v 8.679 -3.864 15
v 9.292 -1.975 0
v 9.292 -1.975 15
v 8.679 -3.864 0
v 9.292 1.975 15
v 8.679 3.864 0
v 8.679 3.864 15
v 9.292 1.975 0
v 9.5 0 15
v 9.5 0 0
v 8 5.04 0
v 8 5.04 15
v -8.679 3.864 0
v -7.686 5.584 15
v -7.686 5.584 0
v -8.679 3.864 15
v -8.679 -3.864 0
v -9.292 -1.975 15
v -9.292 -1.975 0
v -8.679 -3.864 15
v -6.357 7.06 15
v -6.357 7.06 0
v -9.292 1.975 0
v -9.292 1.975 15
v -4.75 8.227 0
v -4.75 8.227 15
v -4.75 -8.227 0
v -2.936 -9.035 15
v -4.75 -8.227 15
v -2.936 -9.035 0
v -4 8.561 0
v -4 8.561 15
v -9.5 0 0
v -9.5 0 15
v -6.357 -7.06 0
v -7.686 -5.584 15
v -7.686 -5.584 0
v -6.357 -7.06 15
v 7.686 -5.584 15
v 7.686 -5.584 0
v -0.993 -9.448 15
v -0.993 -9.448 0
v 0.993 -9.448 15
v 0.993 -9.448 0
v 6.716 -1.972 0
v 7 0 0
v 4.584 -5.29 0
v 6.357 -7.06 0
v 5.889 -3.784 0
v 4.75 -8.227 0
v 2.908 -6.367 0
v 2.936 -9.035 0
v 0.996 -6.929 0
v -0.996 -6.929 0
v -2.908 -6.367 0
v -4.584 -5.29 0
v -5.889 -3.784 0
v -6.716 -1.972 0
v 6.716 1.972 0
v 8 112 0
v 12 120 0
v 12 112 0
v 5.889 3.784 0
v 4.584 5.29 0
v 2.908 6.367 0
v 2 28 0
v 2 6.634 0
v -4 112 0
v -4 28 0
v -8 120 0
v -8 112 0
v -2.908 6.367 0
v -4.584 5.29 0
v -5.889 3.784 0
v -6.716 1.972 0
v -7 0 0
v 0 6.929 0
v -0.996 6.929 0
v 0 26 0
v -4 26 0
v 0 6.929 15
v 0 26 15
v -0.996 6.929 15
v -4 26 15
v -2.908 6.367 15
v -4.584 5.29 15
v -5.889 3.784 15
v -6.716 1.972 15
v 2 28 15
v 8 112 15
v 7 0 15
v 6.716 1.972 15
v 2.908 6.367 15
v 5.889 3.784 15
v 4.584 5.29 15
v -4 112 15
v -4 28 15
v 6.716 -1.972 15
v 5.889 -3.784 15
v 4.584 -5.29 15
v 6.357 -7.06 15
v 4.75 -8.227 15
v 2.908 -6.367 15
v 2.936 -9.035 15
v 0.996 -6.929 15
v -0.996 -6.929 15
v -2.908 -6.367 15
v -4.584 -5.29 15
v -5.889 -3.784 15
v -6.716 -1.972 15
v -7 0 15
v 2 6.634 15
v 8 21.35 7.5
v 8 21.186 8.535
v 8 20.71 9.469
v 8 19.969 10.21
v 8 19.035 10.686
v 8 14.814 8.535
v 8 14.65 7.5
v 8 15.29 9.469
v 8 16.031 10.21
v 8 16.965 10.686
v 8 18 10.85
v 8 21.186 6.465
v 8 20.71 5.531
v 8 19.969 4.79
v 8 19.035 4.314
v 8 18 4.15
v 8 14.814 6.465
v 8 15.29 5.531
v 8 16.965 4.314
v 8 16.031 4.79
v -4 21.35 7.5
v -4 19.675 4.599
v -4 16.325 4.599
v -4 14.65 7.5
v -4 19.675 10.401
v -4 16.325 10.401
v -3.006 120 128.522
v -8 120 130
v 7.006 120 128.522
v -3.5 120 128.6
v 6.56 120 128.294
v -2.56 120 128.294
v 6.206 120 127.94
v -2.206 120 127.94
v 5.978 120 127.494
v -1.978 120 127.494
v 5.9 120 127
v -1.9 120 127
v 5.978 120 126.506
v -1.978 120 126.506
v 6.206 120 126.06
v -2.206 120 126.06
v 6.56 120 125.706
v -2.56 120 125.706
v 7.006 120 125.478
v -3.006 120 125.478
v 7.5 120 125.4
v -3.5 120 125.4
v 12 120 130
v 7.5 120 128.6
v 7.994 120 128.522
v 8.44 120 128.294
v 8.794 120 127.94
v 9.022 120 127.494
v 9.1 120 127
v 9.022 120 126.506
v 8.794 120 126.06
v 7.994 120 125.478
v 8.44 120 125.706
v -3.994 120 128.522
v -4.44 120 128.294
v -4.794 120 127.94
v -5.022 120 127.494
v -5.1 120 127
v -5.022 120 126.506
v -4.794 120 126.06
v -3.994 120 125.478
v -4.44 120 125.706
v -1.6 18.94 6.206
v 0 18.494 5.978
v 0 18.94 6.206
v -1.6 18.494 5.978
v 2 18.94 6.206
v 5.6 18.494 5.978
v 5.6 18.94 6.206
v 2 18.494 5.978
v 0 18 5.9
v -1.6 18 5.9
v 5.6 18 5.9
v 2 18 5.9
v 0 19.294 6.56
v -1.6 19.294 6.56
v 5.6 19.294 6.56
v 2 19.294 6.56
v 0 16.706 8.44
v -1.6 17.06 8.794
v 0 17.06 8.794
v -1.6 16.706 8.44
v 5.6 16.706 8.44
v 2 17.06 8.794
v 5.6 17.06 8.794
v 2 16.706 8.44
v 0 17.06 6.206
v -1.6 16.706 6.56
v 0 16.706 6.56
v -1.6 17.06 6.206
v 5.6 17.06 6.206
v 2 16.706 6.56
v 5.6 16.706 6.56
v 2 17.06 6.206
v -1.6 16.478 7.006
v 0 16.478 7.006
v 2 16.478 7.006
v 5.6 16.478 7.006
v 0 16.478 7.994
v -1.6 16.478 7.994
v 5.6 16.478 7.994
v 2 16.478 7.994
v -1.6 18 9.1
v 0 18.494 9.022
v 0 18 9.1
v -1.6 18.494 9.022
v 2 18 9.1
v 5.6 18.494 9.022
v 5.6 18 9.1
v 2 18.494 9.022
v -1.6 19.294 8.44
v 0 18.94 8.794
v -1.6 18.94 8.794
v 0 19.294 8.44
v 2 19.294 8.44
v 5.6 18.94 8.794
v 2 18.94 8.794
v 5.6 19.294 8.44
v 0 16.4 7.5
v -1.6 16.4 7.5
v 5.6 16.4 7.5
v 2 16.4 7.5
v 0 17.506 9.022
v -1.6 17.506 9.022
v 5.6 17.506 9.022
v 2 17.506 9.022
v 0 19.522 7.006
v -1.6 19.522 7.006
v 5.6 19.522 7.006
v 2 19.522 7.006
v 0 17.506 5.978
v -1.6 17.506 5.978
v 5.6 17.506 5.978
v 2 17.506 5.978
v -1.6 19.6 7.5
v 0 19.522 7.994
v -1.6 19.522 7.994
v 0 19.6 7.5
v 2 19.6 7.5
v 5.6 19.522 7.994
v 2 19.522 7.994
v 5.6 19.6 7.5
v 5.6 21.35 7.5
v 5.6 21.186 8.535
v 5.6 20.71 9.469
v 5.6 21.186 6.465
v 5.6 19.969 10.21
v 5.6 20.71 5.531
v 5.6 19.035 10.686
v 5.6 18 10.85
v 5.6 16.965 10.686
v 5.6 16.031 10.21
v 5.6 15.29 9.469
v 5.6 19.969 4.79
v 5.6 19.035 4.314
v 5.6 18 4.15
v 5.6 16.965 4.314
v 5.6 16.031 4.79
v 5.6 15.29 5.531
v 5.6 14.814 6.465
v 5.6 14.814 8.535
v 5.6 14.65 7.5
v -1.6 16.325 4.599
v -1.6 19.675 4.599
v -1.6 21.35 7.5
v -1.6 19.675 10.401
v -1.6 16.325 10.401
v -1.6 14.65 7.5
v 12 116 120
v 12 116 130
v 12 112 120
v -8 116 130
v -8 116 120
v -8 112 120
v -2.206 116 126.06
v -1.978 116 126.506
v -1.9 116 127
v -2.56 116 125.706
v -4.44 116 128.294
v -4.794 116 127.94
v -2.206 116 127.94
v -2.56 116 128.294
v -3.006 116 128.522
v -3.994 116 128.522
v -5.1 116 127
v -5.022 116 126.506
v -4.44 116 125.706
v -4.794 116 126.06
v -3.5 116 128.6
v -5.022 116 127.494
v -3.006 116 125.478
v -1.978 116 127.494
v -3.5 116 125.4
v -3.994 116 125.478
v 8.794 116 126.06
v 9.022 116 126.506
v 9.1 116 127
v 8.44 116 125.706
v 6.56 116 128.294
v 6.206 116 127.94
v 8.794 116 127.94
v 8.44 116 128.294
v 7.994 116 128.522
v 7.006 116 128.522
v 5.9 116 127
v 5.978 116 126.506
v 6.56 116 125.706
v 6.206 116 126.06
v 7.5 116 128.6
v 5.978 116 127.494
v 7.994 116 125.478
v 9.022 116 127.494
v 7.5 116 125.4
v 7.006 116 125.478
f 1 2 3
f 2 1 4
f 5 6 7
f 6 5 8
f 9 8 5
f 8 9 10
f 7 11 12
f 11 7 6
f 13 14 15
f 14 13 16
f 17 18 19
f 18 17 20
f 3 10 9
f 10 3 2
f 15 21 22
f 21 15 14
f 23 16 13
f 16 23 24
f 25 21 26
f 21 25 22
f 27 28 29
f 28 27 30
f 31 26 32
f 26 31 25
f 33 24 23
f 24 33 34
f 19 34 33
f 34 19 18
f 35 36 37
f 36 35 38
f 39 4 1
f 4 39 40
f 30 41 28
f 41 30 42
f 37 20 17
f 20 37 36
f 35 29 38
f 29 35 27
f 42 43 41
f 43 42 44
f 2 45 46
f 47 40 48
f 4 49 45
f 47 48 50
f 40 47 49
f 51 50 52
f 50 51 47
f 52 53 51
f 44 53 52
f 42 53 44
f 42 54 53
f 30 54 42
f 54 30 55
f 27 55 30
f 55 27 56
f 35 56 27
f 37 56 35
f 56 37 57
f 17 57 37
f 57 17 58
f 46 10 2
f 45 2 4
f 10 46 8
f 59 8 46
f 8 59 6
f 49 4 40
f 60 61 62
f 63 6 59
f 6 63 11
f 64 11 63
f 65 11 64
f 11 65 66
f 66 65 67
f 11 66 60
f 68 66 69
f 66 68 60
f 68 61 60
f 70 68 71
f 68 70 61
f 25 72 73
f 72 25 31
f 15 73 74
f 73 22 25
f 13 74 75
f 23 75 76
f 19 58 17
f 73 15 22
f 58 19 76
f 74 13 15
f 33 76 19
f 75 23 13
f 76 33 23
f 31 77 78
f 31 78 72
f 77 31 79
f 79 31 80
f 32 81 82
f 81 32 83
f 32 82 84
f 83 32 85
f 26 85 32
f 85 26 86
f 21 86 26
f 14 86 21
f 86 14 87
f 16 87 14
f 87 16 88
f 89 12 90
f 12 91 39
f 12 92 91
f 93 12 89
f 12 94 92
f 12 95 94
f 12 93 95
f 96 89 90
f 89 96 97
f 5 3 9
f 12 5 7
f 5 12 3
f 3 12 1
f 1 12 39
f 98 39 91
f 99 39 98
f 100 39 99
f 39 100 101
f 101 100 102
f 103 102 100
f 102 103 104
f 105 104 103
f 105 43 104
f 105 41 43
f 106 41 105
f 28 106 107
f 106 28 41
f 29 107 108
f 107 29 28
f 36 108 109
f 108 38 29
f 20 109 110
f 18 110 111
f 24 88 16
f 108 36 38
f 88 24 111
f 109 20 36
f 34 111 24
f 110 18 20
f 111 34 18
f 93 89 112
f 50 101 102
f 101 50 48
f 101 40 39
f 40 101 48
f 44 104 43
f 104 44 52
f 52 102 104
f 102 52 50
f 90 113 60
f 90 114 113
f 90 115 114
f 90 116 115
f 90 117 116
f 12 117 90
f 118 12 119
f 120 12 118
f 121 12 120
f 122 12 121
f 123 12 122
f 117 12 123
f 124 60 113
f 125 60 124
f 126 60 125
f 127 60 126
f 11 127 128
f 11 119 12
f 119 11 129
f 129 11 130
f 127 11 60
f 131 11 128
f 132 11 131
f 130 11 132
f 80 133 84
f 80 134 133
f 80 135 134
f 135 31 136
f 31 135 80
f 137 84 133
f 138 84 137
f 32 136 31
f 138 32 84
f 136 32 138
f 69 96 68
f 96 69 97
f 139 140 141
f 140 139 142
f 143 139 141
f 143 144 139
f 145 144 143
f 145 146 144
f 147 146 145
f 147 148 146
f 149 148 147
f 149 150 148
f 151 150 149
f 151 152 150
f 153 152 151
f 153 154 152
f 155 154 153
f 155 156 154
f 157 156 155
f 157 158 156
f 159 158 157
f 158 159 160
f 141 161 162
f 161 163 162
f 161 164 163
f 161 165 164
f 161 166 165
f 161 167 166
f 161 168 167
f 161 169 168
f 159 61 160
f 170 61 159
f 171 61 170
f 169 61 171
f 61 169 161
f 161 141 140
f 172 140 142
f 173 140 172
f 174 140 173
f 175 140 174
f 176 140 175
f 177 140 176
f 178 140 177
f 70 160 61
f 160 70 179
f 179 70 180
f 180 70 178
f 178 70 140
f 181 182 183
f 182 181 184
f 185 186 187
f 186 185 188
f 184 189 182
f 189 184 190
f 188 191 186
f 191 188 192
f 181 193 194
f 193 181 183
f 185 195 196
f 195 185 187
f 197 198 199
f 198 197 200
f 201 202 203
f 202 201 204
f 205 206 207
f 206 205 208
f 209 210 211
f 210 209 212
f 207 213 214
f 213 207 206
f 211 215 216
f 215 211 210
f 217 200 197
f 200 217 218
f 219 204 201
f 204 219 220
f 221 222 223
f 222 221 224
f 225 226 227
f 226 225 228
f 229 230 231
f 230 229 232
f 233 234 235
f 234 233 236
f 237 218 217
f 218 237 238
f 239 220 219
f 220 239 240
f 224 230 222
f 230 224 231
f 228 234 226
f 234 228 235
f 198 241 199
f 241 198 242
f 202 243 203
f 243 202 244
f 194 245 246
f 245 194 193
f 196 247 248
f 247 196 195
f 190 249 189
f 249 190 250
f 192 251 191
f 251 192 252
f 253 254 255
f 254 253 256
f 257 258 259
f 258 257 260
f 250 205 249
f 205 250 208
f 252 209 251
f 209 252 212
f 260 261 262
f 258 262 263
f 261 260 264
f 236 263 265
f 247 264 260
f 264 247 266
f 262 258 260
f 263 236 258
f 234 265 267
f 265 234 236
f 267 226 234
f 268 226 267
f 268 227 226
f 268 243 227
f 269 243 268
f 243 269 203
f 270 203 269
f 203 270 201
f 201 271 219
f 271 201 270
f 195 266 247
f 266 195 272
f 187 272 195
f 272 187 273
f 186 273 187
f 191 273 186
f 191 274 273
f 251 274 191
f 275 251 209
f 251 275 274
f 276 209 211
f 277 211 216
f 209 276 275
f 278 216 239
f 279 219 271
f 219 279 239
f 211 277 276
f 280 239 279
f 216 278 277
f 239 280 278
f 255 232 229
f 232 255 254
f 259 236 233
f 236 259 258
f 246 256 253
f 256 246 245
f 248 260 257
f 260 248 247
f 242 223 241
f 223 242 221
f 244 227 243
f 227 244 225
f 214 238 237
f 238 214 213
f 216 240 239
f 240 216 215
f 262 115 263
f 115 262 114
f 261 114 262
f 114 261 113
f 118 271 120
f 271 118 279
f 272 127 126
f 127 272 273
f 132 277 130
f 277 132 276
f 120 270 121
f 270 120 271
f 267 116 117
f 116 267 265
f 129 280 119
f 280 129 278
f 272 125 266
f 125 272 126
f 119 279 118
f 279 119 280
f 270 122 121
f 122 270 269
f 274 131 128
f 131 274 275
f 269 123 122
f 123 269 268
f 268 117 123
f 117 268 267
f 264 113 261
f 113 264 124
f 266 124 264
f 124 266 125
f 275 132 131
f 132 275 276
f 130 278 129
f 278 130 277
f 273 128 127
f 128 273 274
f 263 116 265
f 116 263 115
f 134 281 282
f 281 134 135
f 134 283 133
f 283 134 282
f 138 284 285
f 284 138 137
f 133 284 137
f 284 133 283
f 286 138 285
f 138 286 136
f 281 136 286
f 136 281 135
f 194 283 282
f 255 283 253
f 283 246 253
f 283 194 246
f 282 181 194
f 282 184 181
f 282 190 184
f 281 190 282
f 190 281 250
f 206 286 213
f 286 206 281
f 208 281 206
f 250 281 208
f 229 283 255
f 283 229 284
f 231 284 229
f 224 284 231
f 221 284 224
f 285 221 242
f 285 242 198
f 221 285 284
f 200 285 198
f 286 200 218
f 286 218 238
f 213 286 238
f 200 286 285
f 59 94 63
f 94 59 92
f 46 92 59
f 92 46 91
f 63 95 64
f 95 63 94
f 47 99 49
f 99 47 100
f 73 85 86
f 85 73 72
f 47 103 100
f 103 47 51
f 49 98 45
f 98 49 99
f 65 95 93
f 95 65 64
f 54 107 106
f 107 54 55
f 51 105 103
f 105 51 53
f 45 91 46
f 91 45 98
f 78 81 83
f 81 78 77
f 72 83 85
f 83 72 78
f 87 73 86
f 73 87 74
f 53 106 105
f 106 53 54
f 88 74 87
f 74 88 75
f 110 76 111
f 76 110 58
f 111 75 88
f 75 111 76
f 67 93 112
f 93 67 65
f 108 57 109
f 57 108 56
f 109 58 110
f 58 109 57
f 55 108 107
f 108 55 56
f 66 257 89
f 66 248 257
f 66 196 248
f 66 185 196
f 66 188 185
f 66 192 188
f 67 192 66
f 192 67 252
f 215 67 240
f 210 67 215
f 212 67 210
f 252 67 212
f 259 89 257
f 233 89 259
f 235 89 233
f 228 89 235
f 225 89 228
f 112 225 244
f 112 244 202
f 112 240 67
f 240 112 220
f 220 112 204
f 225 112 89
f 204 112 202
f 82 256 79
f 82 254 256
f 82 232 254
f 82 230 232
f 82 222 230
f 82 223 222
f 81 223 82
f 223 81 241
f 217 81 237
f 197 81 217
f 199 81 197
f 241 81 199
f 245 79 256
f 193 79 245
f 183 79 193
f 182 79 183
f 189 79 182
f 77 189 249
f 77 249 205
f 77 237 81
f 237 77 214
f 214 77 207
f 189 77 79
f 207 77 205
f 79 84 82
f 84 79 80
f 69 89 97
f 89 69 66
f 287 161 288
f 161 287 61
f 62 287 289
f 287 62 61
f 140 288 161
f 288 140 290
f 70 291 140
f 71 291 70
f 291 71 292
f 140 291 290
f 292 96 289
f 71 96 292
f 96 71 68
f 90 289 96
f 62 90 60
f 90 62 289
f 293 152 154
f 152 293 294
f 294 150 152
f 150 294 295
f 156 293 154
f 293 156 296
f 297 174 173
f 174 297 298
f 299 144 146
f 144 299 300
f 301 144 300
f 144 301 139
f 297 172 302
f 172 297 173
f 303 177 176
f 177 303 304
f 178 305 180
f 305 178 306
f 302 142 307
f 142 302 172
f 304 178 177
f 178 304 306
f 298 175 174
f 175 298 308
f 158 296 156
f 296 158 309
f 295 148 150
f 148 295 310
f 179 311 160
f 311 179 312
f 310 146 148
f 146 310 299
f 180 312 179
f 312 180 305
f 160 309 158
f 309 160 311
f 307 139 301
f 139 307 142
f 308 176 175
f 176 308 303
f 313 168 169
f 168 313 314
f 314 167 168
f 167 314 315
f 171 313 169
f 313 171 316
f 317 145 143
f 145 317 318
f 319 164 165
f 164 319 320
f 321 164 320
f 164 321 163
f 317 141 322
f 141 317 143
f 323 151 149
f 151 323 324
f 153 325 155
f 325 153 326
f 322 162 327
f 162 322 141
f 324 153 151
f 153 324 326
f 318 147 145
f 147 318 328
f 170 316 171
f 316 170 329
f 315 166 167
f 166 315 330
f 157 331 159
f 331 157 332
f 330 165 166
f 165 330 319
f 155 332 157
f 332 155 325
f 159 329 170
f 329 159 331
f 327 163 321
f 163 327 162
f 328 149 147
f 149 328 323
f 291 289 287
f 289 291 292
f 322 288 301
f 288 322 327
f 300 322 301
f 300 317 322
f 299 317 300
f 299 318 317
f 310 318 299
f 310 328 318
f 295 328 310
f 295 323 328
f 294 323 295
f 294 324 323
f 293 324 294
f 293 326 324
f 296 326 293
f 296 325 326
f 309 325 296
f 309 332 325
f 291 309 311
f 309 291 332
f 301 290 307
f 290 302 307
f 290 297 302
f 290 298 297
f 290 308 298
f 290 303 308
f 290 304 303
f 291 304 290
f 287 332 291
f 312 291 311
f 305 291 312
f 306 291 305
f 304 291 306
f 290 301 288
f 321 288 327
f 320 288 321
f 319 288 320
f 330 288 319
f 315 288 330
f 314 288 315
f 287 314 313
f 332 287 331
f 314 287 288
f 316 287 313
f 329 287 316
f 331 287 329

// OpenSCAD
// file: ../libs/hardware-recess.scad
/*
 * A library to make capture holes in material for M3 & M5 hardware and some
 * common mounting patterns.
 * Copyright 2021 Alex Volkov <alex@flamy.ca>
 *
 * Project URL
 * https://github.com/avolkov/openscad-designs
 *
 * License: Attribution-ShareAlike 4.0 International (CC BY-SA)
 * https://creativecommons.org/licenses/by-sa/4.0/
 *
 * Version 0.1 2021-04-05 Initial publication
 */

// Common mounting patterns
ear_thick=8;
stacked_len = ear_thick*3;
screw_mount_space = 20;
screw_mount_offset =7;
total_len = stacked_len + screw_mount_space*2;
mounting_diff = 8;


//Globals for hardware diameters
M3_THREAD_RAD = 1.5;
M5_THREAD_RAD = 2.6;


m3_nut_trap_d = 6.7;
m3_nut_thick= 2.4;

//M3 fastener values
m3_bolt_head_d = 5.6;
m3_bolt_thick = 3.2;

//M5 fastener values
m5_nut_thick = 4;
m5_locknut_thick = 5;
nut_trap_d = 9.7;
bolt_head_d = 8.6;



module bolt_nut(hole_len, bolt_d, flip=false){
    /*
    Create a model for a hole with bolt end on one end and nut hole on the other end.
    Note, this functions doesn't subtract the model it only makes the model

    :hole_len: total length of the hole
    :bolt_d: diameter of a blot
    :flip: flip the side with bolt recess
    */
    // currently only implemented for 3mm
    if (flip){
        hole_w_end(hole_len, m3_nut_thick, "hex", bolt_d);
        translate([0,0, hole_len]){
            rotate([180, 0, 0]){
                hole_w_end(hole_len, m3_bolt_thick, "round", bolt_d);
            }
        }
    } else {
        hole_w_end(hole_len, m3_bolt_thick, "round", bolt_d);
        translate([0,0, hole_len]){
            rotate([180, 0, 0]){
                hole_w_end(hole_len, m3_nut_thick, "hex", bolt_d);
            }
        }
    }
}


module hole_w_end(hole_len, trap_height, type, bolt_d, flip=false){
    /*
    Make a hole with an end for bolt or a nut.
    This is a more generic functions replacing m5_ hole-making functions.

    :bolt_d: bolt diameter, i.e. 3, 5 mm
    :type: type of the head hole: 'none', 'hex', 'round
    */
    if (type != "none"){
        cylinder(h=hole_len-trap_height, d=bolt_d, $fn=20);
        if (flip){
            m_recess(trap_height, type, bolt_d);
            translate([0,0,trap_height])
                cylinder(h=hole_len-trap_height, d=bolt_d, $fn=20);

        } else {
                translate([0,0, hole_len - trap_height])
                    m_recess(trap_height, type, bolt_d);
        }
    } else {
        cylinder(h=hole_len, d=bolt_d);
    }
}

module m_recess(length, end_type, bolt_d) {
    /*
    Create nut or bolt capture hole

    :height: length of a mounting hole, including end-mounting hardware
    :end_type: type of the head hole: 'none', 'hex', 'round
    :bolt_d: bolt diameter, i.e. 3, 5 mm
    */
    if (bolt_d >= 3 && bolt_d <= 4){
        //M3
        make_recess(length, end_type, m3_nut_trap_d);
    } else if (bolt_d >= 5 && bolt_d <= 6){
        // M5
        make_recess(length, end_type, nut_trap_d);
    }

}

module make_recess(height, end_type, trap_d){
    /*
    Make recess to capture
    */
    rotate([0, 0,90]){
        if (end_type == "hex"){
            cylinder(h=height, d=trap_d, $fn=6);
        } else if (end_type == "round"){
            cylinder(h=height, d=trap_d, $fn=20);
        }
    }
}


//Functions specific to M5 size,
// TODO rewrite as hole_w_end m_recess
module m5_recess(height, end_type) {
    // nut/bolt capture hole
    rotate([0, 0,90]){
        if (end_type == "hex"){
            cylinder(h=height, d=nut_trap_d, $fn=6);
        } else if (end_type == "round"){
            cylinder(h=height, d=nut_trap_d, $fn=20);
        }
    }
}



module m5_hole_w_end(hole_len, trap_height, type){
    //Given hole lenght and trap height create a nut trap hole
    if (type != "none"){
        cylinder(h=hole_len-trap_height, d=5.3, $fn=20); // M5 hole;
            translate([0,0, hole_len-trap_height])
                m5_recess(trap_height, type);
    } else {
        cylinder(h=hole_len, d=5.3); // M5 hole;
    }
}
module m5_hole_w_ends(hole_len, nut_extra=0){
    m5_hole_w_end(hole_len, m5_nut_thick, "round");
    rotate([0, 180, 0])
        translate([0, 0, - hole_len])
            m5_hole_w_end(hole_len, m5_nut_thick + nut_extra, "hex");
}

module m3_hole_w_ends(hole_len, nut_extra=0){
    hole_w_end(hole_len, m3_nut_thick, "round", m3_bolt_thick);
    hole_w_end(hole_len, m3_nut_thick, "hex", m3_bolt_thick, flip=true);
}

module set_mounting_hole(x_offset, y_offset, thickness, nut_height, end_type){
    /*
    Make a hole in an existing material
    end_type: one of hex, round, none
    */
    translate([x_offset, y_offset, 0]){
        m5_hole_w_end(thickness, nut_height, end_type);
    }
}

module m5_thread(height){
    cylinder(h=height, r1=M5_THREAD_RAD, r2=M5_THREAD_RAD, center=true, $fn=16);
}

module m3_thread(height){
    cylinder(h=height, r1=M3_THREAD_RAD, r2=M3_THREAD_RAD, center=true, $fn=16);
}

module m3_square_nut(depth, height){
    translate([0,0,1])
        cylinder(
        h=height, r1=M3_THREAD_RAD, r2=M3_THREAD_RAD, center=true, $fn=16);

    m_recess(m3_nut_thick, "hex",3);
    translate([0,0,-1])
        cylinder(
            h=depth, r1=M3_THREAD_RAD, r2=M3_THREAD_RAD, center=true, $fn=16);
}



//Mounting Patterns

module mounting_holes_2(fastener_len, nut_height, end_type){
    /* Two-hole mounting pattern for M5 bolts*/
    width_offsetn = 16;
    set_mounting_hole(
        screw_mount_offset,
        width_offset + mounting_diff,
        fastener_len,
        nut_height,
        end_type);

    set_mounting_hole(
        total_len - screw_mount_offset,
        width_offset + mounting_diff,
        fastener_len,
        nut_height,
        end_type);


 }

module mounting_holes(fastener_len, nut_height, end_type){
    /*Four-hole mounting pattern for M5 bolts*/
    width_offset = 16;
    set_mounting_hole(
        screw_mount_offset,
        width_offset + mounting_diff,
        fastener_len,
        nut_height,
        end_type);

    set_mounting_hole(
        screw_mount_offset,
        width_offset - mounting_diff,
        fastener_len,
        nut_height,
        end_type);

    // Side towards the end
    set_mounting_hole(
        total_len - screw_mount_offset,
        width_offset + mounting_diff,
        fastener_len,
        nut_height,
        end_type);

    set_mounting_hole(
        total_len - screw_mount_offset,
        width_offset - mounting_diff,
        fastener_len,
        nut_height,
        end_type);
}
// main file
include <../libs/hardware-recess.scad>;

/*
 * Adapter for Simple Microphone Pop filter -- https://www.thingiverse.com/thing:1108999
 * and Ammon MS-12 Mini Foldable Desktop Microphone Stand
 *
 * Project URL
 * https://github.com/avolkov/openscad-designs/pop-filter-holder
 *
 * License: Attribution-ShareAlike 4.0 International (CC BY-SA)
 * https://creativecommons.org/licenses/by-sa/4.0/
 *
 * Version 1.0 2021-04-05 Initial publication
 */

MOUNT_H = 15;
MOUNT_W = 12;

module tube_mount(lock_d, mount_h, mount_cube_len){
    /*
        Add a tightening mout around the tube of a specified diameter
        lock_d -- locking diameter of a tube
        mount_h -- mount height (height of the part)
        mount_cube_len -- length of a joining cube
    */
    
    mount_w = MOUNT_W;
    difference() {
        union(){
            cylinder(d=lock_d+5, h=mount_h);
            translate([-4, 0,0])cube([mount_w,mount_cube_len,mount_h]);
        }
        cylinder(d=lock_d, h=mount_h);
        // cut to tighten the round thingy
        translate([0, 2, 0])
            cube([2,25,mount_h]);
        //Cut on the right
        translate([2, 26, 0])
            rotate([0,0,90])
                cube([2,10,mount_h]);
        //recess for the bolt
        translate([-4, 18, mount_h/2])
            rotate([0, 90, 0])
                m3_hole_w_ends(mount_w);
    }
}

module base_model(){
    difference(){
        tube_mount(14, MOUNT_H, 120);
    }
    translate([-8, 112, 0])
        cube([20, 8, 130]);
    
}

module pop_filter_mount_points() {
    // Mount points for Simple Microphone Pop filter
    cube([20, 4, 10]);
    translate([4.5, 0, 7]){
        rotate([270, 0, 0])
            m3_hole_w_ends(20);
    }
    translate([15.5, 0, 7]){
        rotate([270, 0, 0])
            m3_hole_w_ends(20);
    }
}

module base_with_mounts(){
    // Add mounting points by subtracting material from base_model
    difference () {
        base_model();
        translate([-8, 112, 120]){
            pop_filter_mount_points();
        }
    }
}

module dummy_adjust_tolerances() {
    /*
        dummy part to test tolerances without printing the whole model
        usually disabled
    */
    difference() {
        cube([20, 8, 20]);
        cube([20, 4, 10]);
        translate([4.5, -3, 4.5]){
            rotate([270, 0, 0]) m3_hole_w_ends(20);
        }

        translate([15.5, -3, 4.5]){
            rotate([270, 0, 0]) m3_hole_w_ends(20);
        }
    }
}

base_with_mounts();
